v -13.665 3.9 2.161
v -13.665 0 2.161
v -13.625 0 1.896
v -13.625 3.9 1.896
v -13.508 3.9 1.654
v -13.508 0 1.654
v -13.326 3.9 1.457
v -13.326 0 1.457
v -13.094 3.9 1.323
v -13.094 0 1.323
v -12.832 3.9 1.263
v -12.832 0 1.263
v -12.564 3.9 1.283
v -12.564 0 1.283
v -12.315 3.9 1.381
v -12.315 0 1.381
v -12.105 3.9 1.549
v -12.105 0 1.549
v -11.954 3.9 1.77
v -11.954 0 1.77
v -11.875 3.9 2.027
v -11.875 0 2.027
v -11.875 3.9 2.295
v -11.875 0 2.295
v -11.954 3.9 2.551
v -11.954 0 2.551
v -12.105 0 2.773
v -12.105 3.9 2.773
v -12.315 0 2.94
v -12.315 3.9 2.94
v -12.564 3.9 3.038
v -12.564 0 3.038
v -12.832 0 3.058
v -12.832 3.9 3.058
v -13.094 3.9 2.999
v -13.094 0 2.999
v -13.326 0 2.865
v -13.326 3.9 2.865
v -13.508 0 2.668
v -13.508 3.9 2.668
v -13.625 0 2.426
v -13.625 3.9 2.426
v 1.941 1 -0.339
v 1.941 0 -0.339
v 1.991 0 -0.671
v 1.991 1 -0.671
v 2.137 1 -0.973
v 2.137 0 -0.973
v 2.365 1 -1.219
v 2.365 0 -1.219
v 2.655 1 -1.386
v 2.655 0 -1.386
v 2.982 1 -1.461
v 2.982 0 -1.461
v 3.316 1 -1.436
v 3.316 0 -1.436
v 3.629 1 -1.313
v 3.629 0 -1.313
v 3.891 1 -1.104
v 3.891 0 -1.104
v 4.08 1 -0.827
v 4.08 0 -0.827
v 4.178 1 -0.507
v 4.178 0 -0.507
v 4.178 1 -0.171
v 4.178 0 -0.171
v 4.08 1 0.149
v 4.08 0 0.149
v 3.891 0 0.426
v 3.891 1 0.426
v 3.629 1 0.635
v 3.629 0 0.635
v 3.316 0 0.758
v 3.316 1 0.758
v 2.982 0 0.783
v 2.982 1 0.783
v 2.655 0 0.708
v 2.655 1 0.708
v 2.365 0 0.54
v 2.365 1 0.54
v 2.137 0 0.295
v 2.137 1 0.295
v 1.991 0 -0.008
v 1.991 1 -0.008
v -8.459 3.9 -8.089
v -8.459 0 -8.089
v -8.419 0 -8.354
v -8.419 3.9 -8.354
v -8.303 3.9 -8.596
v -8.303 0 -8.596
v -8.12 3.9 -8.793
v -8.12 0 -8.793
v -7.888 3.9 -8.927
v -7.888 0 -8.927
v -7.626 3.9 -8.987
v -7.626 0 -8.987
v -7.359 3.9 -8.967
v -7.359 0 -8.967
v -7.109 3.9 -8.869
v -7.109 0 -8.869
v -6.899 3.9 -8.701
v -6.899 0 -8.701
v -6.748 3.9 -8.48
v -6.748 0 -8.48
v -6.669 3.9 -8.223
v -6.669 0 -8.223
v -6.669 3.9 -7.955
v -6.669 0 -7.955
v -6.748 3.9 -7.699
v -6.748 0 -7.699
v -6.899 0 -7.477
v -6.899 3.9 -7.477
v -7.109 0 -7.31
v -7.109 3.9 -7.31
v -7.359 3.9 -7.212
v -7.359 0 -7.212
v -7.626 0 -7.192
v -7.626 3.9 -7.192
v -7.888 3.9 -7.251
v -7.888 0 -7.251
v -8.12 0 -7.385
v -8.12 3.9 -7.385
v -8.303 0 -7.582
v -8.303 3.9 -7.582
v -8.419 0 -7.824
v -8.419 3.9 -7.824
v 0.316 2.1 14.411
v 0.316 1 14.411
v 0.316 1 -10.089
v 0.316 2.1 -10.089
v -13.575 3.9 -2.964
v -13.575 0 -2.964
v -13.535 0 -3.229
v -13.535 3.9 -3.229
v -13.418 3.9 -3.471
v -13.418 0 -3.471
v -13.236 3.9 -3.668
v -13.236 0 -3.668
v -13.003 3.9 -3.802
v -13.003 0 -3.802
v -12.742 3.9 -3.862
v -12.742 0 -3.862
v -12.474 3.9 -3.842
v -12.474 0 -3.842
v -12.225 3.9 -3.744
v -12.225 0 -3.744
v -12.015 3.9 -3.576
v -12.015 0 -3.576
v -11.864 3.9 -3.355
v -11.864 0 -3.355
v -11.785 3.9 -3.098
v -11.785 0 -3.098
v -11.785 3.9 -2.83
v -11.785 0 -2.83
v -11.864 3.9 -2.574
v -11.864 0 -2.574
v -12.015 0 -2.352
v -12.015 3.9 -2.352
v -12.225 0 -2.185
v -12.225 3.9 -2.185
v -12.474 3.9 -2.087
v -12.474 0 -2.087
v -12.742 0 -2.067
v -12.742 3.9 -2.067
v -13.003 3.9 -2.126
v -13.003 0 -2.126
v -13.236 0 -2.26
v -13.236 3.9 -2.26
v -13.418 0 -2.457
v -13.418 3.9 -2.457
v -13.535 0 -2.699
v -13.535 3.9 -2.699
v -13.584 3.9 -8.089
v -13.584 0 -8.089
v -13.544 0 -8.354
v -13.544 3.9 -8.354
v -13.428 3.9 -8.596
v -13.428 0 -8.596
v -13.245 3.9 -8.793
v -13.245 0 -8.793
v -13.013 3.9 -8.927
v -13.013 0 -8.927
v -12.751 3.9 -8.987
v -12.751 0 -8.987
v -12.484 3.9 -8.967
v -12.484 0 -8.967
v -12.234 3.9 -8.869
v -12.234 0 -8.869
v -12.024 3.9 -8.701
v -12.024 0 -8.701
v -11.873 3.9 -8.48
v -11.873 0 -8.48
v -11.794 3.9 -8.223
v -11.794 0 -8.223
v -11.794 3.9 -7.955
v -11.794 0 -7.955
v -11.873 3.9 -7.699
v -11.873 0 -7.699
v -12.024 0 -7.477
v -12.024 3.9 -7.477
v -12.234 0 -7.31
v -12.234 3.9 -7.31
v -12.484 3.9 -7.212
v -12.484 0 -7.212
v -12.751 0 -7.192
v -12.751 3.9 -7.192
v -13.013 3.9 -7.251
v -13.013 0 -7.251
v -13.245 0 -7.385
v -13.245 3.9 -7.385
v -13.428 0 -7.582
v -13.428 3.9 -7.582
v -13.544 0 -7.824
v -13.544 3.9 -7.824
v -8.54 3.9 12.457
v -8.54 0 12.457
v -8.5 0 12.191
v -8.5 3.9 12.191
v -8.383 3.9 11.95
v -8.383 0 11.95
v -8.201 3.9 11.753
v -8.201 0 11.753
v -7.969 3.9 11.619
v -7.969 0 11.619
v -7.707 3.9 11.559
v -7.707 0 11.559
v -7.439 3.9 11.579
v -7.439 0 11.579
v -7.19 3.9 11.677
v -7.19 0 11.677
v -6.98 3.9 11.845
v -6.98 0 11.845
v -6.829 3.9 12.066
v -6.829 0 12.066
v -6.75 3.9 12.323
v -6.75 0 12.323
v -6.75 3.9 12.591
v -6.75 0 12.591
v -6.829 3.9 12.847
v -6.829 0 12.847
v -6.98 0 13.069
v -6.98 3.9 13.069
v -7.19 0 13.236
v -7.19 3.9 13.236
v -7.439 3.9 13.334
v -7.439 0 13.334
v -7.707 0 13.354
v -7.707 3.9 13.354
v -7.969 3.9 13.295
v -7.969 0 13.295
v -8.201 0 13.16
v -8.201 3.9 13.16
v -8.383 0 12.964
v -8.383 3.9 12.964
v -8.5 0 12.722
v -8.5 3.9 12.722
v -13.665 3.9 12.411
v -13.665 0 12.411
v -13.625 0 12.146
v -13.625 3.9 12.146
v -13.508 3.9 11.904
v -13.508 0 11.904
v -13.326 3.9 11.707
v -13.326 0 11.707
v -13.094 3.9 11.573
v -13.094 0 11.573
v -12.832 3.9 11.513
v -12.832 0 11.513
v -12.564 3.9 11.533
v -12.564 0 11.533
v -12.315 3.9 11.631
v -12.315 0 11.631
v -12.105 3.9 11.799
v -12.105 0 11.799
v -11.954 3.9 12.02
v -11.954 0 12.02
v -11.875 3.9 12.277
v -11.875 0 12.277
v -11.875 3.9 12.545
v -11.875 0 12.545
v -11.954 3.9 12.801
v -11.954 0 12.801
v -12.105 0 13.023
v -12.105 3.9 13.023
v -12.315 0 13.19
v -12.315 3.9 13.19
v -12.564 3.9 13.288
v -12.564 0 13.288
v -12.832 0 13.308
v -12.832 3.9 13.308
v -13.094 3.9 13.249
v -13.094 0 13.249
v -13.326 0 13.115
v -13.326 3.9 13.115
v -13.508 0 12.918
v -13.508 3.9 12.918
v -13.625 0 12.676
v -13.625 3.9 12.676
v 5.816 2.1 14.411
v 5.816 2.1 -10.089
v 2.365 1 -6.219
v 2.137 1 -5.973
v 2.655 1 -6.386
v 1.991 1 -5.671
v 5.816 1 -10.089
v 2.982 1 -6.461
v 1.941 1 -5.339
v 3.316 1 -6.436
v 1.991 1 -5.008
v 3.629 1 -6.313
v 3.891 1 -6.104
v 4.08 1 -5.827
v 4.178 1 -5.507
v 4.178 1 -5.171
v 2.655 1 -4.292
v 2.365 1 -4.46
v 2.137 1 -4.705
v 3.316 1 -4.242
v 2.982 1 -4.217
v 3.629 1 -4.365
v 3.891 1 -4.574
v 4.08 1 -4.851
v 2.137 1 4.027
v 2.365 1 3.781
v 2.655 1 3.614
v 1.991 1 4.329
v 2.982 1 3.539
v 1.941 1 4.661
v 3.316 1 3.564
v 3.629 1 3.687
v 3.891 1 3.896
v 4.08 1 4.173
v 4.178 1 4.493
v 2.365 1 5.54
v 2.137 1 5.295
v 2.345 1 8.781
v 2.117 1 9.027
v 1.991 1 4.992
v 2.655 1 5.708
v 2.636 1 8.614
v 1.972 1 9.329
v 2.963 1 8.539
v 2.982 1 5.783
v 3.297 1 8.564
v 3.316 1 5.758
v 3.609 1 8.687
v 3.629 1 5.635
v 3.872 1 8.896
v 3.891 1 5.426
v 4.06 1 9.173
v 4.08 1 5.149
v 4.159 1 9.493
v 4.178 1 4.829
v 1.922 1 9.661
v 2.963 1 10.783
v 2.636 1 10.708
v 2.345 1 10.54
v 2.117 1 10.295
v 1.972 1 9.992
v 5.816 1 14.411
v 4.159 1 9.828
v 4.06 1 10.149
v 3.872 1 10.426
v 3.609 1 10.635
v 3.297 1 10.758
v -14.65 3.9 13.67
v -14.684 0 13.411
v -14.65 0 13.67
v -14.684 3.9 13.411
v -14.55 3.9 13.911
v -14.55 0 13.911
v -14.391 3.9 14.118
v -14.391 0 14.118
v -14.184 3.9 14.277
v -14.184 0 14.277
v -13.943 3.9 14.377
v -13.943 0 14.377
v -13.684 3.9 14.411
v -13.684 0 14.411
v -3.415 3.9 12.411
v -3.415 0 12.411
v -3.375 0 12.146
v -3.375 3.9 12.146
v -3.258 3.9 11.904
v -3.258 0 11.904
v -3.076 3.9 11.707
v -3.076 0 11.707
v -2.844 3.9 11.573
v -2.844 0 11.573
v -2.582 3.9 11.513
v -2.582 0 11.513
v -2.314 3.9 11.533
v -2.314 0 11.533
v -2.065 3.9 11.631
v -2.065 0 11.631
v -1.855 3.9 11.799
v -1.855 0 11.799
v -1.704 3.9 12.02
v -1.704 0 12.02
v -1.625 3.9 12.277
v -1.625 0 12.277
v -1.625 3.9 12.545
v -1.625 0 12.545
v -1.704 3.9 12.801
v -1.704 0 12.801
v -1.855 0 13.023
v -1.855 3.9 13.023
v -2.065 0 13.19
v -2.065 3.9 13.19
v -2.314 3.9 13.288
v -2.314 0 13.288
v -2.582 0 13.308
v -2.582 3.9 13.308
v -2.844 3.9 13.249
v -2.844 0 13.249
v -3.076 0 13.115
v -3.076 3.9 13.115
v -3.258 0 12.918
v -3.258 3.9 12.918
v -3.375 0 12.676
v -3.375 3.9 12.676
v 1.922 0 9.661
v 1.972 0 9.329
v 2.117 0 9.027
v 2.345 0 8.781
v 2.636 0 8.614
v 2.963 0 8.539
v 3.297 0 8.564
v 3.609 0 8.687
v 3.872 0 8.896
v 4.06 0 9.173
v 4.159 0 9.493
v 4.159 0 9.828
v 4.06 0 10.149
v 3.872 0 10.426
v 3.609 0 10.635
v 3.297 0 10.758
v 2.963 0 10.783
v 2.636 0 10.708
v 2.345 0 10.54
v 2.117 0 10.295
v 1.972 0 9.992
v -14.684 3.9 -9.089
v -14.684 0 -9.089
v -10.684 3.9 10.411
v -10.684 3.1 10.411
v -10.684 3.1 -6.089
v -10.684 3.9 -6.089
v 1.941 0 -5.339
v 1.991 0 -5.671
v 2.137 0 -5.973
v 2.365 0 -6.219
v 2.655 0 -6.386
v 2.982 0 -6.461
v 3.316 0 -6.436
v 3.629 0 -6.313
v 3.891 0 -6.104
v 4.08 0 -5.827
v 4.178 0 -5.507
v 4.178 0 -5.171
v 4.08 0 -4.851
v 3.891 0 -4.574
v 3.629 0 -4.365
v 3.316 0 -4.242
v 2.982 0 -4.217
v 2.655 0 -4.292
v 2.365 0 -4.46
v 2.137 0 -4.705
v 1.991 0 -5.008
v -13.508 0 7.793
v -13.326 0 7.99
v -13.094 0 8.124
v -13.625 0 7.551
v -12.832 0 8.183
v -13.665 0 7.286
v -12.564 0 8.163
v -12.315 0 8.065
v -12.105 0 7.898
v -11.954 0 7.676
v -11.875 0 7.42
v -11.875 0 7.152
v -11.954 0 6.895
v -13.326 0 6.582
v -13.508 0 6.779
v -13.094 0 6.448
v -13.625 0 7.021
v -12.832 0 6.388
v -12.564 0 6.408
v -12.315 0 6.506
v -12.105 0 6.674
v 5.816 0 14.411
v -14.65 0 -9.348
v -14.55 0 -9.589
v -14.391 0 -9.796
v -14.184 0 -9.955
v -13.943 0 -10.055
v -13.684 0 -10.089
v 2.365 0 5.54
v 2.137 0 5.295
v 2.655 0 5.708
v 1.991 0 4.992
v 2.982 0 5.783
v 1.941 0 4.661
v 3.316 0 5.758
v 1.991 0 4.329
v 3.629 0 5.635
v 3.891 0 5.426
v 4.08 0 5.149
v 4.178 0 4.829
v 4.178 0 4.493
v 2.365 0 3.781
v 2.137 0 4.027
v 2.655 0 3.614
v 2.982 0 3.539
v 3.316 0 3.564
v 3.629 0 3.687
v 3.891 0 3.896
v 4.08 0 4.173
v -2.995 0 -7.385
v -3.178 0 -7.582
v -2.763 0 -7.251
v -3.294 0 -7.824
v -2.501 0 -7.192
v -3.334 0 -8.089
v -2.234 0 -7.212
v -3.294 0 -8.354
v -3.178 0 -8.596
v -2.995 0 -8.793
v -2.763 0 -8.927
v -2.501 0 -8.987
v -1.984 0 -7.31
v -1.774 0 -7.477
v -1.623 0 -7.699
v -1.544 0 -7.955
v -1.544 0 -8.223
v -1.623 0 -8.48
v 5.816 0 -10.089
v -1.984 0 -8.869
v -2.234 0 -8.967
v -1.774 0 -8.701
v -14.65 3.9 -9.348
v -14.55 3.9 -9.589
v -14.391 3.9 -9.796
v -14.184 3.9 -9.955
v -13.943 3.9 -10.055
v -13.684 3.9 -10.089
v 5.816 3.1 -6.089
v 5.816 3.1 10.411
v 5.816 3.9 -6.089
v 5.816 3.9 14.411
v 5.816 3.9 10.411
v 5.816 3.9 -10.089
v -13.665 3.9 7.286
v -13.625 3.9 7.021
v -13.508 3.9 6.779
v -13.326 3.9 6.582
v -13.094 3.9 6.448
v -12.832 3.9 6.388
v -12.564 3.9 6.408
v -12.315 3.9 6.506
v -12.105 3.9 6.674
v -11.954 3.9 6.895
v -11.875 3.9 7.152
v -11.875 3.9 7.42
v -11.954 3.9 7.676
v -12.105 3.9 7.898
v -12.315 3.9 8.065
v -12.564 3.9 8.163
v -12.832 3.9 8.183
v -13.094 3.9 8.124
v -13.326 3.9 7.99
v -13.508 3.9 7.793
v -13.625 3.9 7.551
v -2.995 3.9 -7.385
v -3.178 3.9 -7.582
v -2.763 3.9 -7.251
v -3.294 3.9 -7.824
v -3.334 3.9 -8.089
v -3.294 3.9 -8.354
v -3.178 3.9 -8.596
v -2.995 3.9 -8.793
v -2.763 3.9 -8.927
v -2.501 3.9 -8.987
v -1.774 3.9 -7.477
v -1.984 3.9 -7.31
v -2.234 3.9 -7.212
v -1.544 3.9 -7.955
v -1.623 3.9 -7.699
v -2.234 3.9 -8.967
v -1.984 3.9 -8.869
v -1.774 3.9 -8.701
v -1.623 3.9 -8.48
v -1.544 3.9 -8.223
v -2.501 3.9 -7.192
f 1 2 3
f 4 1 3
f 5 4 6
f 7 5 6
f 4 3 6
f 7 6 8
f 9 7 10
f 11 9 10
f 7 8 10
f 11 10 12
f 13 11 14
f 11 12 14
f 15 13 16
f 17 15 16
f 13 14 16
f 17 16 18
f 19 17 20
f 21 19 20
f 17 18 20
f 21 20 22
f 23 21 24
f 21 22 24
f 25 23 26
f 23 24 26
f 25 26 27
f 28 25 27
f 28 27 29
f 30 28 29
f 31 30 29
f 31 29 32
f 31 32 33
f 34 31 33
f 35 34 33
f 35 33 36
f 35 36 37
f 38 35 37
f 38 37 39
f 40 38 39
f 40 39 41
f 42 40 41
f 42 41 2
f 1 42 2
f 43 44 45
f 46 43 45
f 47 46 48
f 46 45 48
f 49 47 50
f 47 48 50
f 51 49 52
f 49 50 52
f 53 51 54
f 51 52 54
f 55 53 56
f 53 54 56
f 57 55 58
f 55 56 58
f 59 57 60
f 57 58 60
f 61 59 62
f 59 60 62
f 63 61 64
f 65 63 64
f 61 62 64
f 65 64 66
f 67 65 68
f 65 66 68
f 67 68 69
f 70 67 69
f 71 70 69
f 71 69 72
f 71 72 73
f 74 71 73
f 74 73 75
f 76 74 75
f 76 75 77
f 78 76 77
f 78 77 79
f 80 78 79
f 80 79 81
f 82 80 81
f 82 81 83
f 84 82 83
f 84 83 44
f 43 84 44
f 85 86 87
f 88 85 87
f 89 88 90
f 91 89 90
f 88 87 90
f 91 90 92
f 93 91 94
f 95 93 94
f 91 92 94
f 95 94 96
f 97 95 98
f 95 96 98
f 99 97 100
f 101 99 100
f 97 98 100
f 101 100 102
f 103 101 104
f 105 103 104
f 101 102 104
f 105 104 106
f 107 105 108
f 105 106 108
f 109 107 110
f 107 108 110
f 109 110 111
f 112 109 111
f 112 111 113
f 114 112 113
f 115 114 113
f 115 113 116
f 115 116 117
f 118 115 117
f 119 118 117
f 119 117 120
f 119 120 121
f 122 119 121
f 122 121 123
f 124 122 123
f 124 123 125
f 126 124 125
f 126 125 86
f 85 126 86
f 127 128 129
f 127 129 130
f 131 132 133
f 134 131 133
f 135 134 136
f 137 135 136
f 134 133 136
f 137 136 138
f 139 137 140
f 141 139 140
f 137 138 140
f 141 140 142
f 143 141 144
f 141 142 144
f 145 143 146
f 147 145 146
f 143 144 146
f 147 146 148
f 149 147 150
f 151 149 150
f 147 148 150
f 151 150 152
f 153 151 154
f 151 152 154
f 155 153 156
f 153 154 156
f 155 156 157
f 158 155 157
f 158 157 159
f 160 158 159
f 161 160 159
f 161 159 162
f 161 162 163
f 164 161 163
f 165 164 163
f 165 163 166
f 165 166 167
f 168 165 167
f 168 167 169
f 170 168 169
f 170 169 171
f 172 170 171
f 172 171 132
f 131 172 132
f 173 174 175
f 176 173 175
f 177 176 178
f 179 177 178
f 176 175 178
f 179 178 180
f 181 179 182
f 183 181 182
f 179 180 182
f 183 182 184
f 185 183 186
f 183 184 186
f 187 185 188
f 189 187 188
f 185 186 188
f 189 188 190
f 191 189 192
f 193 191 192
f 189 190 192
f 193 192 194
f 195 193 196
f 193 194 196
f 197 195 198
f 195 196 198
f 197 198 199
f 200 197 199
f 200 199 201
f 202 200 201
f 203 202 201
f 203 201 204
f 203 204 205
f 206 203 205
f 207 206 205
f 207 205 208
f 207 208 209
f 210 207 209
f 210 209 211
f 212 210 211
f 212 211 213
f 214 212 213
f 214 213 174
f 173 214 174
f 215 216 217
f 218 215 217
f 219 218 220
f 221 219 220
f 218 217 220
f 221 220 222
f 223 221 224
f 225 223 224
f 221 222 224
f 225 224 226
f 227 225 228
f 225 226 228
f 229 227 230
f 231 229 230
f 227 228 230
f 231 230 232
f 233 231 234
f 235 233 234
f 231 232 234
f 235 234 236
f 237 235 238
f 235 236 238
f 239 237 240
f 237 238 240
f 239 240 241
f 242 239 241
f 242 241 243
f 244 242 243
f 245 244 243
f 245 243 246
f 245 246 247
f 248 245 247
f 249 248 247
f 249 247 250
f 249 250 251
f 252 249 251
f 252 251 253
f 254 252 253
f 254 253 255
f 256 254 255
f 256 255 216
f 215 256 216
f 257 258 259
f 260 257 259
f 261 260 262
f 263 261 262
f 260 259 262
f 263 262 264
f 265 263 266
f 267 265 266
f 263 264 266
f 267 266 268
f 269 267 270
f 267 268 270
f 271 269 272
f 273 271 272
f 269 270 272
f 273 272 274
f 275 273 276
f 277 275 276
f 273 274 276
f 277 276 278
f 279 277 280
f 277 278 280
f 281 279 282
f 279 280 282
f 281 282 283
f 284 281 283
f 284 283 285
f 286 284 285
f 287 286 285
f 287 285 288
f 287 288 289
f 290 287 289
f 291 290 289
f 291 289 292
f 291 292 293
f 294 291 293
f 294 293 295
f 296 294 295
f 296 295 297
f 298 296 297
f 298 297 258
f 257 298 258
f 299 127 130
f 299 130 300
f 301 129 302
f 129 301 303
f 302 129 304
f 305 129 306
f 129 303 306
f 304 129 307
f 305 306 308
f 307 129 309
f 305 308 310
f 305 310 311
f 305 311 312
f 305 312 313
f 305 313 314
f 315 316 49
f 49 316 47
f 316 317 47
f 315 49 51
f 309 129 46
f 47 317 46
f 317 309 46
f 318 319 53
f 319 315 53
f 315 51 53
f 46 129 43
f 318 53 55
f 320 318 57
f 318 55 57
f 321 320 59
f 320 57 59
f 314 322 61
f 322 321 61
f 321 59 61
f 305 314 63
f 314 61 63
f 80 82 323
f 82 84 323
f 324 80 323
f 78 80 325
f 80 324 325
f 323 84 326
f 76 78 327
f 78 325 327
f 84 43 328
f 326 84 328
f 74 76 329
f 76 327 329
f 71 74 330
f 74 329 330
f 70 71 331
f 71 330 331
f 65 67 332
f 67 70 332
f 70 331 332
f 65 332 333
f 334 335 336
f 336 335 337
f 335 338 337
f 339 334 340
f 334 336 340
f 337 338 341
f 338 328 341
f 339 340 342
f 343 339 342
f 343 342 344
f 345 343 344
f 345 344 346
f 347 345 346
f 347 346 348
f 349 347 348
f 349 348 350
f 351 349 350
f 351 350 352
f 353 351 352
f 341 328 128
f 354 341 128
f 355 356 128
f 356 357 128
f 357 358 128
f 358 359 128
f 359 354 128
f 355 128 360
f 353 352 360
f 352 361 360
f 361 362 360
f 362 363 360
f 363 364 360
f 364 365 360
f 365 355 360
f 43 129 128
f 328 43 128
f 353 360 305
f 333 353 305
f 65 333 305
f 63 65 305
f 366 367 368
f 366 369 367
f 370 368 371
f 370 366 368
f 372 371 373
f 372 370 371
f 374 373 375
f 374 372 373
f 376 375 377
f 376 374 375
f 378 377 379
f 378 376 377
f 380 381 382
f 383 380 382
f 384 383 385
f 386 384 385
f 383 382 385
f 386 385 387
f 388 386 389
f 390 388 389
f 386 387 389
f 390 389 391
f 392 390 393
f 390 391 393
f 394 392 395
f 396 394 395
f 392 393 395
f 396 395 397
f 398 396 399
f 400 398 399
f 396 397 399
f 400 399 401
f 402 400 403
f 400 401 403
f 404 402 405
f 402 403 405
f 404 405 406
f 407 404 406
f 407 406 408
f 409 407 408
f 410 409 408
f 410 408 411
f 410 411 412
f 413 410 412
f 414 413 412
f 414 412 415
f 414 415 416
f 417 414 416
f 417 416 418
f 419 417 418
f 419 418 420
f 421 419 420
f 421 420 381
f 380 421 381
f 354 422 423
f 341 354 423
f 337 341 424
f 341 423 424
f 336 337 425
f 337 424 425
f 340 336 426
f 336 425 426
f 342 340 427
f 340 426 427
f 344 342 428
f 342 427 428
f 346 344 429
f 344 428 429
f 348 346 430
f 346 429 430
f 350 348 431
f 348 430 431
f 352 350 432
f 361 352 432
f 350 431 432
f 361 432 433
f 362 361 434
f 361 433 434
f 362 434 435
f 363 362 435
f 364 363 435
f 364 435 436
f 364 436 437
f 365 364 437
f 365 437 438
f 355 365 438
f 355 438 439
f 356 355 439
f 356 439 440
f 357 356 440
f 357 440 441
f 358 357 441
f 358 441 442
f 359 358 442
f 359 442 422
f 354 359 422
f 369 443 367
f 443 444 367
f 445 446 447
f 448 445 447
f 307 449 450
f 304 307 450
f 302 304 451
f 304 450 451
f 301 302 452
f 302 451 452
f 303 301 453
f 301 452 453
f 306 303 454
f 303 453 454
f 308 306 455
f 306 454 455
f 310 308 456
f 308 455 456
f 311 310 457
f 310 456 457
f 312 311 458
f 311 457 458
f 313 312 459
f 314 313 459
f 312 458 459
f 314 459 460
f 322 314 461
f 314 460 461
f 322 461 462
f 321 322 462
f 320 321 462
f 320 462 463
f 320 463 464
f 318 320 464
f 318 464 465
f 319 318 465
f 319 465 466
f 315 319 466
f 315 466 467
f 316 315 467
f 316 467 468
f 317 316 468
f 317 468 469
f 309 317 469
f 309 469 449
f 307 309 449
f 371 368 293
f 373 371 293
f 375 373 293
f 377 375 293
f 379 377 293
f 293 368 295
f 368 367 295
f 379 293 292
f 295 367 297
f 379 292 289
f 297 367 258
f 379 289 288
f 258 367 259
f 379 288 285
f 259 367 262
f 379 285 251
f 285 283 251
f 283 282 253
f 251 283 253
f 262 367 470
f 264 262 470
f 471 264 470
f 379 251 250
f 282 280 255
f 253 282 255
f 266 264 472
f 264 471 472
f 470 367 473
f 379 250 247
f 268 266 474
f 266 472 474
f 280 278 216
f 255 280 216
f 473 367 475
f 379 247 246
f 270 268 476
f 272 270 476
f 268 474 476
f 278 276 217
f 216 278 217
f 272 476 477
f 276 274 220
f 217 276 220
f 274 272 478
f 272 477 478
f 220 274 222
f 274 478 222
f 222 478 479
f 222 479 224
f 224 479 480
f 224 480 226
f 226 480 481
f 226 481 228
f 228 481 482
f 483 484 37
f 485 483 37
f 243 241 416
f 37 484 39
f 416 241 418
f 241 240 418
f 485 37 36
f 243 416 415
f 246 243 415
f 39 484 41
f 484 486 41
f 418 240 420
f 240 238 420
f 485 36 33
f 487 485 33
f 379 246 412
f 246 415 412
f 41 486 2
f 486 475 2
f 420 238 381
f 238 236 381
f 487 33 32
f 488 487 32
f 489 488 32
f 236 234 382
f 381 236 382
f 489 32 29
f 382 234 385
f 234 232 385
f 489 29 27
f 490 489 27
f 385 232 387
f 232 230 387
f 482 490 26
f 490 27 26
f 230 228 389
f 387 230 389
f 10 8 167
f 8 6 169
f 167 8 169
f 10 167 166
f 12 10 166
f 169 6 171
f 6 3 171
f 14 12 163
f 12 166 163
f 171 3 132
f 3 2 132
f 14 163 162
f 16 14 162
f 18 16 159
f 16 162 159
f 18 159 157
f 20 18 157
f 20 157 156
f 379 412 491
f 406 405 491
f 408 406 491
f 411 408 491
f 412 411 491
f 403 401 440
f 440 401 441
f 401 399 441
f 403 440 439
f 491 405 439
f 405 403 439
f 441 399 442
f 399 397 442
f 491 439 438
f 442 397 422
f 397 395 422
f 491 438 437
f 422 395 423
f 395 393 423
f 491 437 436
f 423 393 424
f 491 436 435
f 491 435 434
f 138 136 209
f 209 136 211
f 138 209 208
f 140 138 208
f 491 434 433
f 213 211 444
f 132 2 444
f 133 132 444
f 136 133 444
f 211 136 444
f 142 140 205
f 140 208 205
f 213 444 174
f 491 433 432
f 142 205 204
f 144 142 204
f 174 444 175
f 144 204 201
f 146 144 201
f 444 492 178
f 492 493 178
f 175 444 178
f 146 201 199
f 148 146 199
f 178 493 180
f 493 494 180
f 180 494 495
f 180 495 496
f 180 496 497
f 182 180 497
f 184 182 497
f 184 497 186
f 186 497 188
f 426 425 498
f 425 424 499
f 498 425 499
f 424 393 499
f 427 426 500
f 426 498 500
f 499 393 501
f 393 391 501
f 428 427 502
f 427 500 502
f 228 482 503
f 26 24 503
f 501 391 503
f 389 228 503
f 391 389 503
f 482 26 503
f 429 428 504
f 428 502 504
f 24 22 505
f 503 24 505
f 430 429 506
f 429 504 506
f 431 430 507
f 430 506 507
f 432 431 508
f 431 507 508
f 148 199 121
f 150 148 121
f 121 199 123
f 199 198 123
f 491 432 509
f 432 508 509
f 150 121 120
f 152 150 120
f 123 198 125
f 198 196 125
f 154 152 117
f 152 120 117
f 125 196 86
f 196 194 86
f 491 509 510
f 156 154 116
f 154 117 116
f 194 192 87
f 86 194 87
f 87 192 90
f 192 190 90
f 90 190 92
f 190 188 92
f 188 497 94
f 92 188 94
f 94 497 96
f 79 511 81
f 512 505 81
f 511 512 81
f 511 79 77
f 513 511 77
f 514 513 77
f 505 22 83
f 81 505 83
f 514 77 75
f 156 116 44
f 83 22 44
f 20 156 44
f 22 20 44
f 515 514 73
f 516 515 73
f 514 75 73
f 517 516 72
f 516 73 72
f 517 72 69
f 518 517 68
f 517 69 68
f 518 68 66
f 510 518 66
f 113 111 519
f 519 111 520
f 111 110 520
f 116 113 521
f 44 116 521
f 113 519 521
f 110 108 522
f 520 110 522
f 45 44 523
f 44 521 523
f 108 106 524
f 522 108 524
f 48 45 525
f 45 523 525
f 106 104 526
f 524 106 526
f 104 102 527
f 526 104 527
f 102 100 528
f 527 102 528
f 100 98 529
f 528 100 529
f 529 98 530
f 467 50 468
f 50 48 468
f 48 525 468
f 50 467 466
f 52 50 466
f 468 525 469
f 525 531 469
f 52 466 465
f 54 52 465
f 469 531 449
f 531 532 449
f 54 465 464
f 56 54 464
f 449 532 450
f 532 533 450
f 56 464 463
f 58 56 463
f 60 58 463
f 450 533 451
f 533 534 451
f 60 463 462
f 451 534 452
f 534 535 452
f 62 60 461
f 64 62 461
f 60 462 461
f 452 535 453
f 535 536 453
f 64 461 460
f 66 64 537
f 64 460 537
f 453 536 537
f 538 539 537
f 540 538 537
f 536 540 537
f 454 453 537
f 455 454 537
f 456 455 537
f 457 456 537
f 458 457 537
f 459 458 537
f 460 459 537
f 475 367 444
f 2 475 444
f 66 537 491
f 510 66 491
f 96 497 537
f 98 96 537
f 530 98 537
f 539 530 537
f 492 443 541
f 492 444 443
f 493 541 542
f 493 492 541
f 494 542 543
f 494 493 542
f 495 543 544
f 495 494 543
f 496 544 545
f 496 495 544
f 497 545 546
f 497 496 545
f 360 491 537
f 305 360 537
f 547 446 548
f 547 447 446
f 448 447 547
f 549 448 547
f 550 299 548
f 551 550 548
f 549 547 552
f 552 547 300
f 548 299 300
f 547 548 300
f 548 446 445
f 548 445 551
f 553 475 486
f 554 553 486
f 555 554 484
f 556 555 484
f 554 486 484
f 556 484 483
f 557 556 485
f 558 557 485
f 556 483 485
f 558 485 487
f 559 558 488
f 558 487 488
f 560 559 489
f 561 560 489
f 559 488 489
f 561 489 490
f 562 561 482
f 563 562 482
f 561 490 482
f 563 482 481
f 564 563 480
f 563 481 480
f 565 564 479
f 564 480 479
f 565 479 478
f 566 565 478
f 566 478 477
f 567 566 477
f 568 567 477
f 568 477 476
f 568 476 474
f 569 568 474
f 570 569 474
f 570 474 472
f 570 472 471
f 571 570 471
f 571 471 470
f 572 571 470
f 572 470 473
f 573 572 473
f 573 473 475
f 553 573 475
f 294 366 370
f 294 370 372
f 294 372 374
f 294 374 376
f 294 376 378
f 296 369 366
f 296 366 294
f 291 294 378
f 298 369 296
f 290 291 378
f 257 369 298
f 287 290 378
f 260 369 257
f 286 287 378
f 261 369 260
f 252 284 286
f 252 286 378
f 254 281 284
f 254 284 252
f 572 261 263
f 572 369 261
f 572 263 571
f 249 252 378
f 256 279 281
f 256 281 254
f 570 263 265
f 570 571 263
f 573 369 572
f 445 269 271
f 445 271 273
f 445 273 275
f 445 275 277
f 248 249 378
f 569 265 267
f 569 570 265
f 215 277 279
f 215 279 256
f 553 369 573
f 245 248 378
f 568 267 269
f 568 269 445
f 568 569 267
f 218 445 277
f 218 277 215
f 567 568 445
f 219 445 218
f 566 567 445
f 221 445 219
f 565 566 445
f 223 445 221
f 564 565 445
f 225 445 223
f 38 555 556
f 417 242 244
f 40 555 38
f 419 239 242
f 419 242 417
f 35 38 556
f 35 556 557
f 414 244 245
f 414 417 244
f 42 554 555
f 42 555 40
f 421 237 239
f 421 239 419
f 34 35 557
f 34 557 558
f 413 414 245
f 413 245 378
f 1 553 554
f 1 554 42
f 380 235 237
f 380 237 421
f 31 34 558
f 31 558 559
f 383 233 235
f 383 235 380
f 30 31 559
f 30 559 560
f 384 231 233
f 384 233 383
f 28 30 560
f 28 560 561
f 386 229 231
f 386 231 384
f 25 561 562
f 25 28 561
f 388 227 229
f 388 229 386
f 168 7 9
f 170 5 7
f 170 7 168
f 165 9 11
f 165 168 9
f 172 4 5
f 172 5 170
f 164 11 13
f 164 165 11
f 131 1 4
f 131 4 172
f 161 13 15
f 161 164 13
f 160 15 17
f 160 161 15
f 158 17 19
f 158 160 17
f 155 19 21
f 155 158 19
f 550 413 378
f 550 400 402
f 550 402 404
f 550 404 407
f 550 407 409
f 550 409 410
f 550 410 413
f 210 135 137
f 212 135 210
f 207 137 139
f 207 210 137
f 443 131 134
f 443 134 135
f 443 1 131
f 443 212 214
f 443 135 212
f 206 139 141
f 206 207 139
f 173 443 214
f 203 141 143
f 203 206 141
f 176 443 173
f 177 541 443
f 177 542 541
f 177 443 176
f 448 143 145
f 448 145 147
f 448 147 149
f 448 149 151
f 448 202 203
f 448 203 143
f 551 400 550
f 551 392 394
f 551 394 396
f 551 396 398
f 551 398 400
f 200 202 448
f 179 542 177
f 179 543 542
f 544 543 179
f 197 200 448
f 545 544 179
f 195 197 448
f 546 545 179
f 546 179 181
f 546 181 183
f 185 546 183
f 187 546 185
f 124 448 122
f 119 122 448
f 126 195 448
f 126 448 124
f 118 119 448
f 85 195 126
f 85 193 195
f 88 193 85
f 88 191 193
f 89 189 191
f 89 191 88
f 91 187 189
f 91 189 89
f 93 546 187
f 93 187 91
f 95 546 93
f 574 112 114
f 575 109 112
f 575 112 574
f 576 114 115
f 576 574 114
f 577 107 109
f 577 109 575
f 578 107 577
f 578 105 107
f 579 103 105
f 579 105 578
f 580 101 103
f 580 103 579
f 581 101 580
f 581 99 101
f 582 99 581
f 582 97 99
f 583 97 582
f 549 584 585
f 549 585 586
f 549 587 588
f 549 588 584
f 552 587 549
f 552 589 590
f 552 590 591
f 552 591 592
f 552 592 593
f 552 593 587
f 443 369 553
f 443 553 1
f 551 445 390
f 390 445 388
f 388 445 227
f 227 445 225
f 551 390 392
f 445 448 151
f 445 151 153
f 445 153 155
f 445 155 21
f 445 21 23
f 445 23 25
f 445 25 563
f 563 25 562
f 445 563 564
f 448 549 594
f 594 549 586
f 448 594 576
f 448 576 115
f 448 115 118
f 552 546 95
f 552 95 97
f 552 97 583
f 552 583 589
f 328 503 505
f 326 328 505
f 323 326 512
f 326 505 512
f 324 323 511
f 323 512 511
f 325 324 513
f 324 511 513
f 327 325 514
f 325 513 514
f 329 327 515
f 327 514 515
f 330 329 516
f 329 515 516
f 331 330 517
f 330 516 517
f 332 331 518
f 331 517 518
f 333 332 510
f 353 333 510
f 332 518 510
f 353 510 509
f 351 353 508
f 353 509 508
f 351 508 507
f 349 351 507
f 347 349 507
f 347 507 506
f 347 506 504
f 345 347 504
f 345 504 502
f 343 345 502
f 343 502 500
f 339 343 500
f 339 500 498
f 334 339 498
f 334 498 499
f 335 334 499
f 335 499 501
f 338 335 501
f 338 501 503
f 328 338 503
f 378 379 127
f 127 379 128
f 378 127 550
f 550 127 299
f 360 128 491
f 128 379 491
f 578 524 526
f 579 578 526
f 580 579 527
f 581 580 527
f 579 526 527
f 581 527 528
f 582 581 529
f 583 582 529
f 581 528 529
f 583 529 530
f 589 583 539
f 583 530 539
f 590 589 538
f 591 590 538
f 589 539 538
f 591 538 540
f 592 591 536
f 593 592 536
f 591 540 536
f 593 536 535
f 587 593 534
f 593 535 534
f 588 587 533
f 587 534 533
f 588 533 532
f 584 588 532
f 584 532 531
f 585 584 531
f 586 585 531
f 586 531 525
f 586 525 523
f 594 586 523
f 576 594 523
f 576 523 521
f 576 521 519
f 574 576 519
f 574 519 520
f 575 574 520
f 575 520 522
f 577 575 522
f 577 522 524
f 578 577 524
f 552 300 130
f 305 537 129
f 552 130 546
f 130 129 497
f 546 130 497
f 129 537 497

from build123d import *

# Parameters (mm, degrees)
SKETCH1_W                           = 20.5
SKETCH1_H                           = 24.5
BOSS_EXTRUDE1_DEPTH                 = 3.1
SKETCH2_W                           = 5.5
SKETCH2_H                           = 1.1
CUT_EXTRUDE1_DEPTH                  = 29.731142046
SKETCH3_W                           = 16.5
SKETCH3_H                           = 4
BOSS_EXTRUDE2_DEPTH                 = 0.8
TAP_DRILL_FOR_M2_5X0_45_TAP1_REACH  = 22.94
TAP_DRILL_FOR_M2_5X0_45_TAP1_BORE_R = 1.125
TAP_DRILL_FOR_M2X0_4_TAP2_D         = 1.8
FILLET2_R                           = 1


with BuildPart() as part:
    # Sketch1 → Boss-Extrude1 (new body)
    with BuildSketch(Plane(origin=(0, 0, 0), x_dir=(1, 0, 0), z_dir=(0, 1, 0))):
        with Locations((-4.433954619, -2.160858995)):
            Rectangle(SKETCH1_W, SKETCH1_H)
    extrude(amount=BOSS_EXTRUDE1_DEPTH)

    # Sketch2 → Cut-Extrude1 (cut, through all)
    with BuildSketch(Plane.XY.offset(14.410858995)):
        with Locations((3.066045381, 1.55)):
            Rectangle(SKETCH2_W, SKETCH2_H)
    extrude(amount=-CUT_EXTRUDE1_DEPTH, mode=Mode.SUBTRACT)

    # Sketch3 → Boss-Extrude2 (add)
    with BuildSketch(Plane(origin=(0, 3.1, 0), x_dir=(1, 0, 0), z_dir=(0, 1, 0))):
        Polygon((-10.683954619, 10.089141005), (-14.683954619, 10.089141005), (-14.683954619, -14.410858995), (-10.683954619, -14.410858995), (-10.683954619, -10.410858995), (-10.683954619, 6.089141005), align=None)
        with Locations((-2.433954619, 8.089141005)):
            Rectangle(SKETCH3_W, SKETCH3_H)
        with Locations((-2.433954619, -12.410858995)):
            Rectangle(SKETCH3_W, SKETCH3_H)
    extrude(amount=BOSS_EXTRUDE2_DEPTH)

    # Tap Drill for M2.5x0.45 Tap1 bore → Tap Drill for M2.5x0.45 Tap1 (cut, up to next)
    with BuildSketch(Plane(origin=(0, 0, 0), x_dir=(-1, 0, 0), z_dir=(0, -1, 0)), mode=Mode.PRIVATE) as tap_drill_for_m2_5x0_45_tap1_sk1:
        with Locations((-3.066045381, 5.339141005)):
            Circle(TAP_DRILL_FOR_M2_5X0_45_TAP1_BORE_R)
    tap_drill_for_m2_5x0_45_tap1_tool1 = extrude(tap_drill_for_m2_5x0_45_tap1_sk1.sketch, amount=-TAP_DRILL_FOR_M2_5X0_45_TAP1_REACH, mode=Mode.PRIVATE) & part.part
    # Tap Drill for M2.5x0.45 Tap1 bore → Tap Drill for M2.5x0.45 Tap1 (cut, up to next)
    with BuildSketch(Plane(origin=(0, 0, 0), x_dir=(-1, 0, 0), z_dir=(0, -1, 0)), mode=Mode.PRIVATE) as tap_drill_for_m2_5x0_45_tap1_sk2:
        with Locations((-3.066045381, 0.339141005)):
            Circle(TAP_DRILL_FOR_M2_5X0_45_TAP1_BORE_R)
    tap_drill_for_m2_5x0_45_tap1_tool2 = extrude(tap_drill_for_m2_5x0_45_tap1_sk2.sketch, amount=-TAP_DRILL_FOR_M2_5X0_45_TAP1_REACH, mode=Mode.PRIVATE) & part.part
    # Tap Drill for M2.5x0.45 Tap1 bore → Tap Drill for M2.5x0.45 Tap1 (cut, up to next)
    with BuildSketch(Plane(origin=(0, 0, 0), x_dir=(-1, 0, 0), z_dir=(0, -1, 0)), mode=Mode.PRIVATE) as tap_drill_for_m2_5x0_45_tap1_sk3:
        with Locations((-3.066045381, -4.660858995)):
            Circle(TAP_DRILL_FOR_M2_5X0_45_TAP1_BORE_R)
    tap_drill_for_m2_5x0_45_tap1_tool3 = extrude(tap_drill_for_m2_5x0_45_tap1_sk3.sketch, amount=-TAP_DRILL_FOR_M2_5X0_45_TAP1_REACH, mode=Mode.PRIVATE) & part.part
    # Tap Drill for M2.5x0.45 Tap1 bore → Tap Drill for M2.5x0.45 Tap1 (cut, up to next)
    with BuildSketch(Plane(origin=(0, 0, 0), x_dir=(-1, 0, 0), z_dir=(0, -1, 0)), mode=Mode.PRIVATE) as tap_drill_for_m2_5x0_45_tap1_sk4:
        with Locations((-3.046847319, -9.660822138)):
            Circle(TAP_DRILL_FOR_M2_5X0_45_TAP1_BORE_R)
    tap_drill_for_m2_5x0_45_tap1_tool4 = extrude(tap_drill_for_m2_5x0_45_tap1_sk4.sketch, amount=-TAP_DRILL_FOR_M2_5X0_45_TAP1_REACH, mode=Mode.PRIVATE) & part.part
    add(tap_drill_for_m2_5x0_45_tap1_tool1.solids().sort_by_distance((3.066045, 0, -5.339141))[0], mode=Mode.SUBTRACT)
    add(tap_drill_for_m2_5x0_45_tap1_tool2.solids().sort_by_distance((3.066045, 0, -0.339141))[0], mode=Mode.SUBTRACT)
    add(tap_drill_for_m2_5x0_45_tap1_tool3.solids().sort_by_distance((3.066045, 0, 4.660859))[0], mode=Mode.SUBTRACT)
    add(tap_drill_for_m2_5x0_45_tap1_tool4.solids().sort_by_distance((3.046847, 0, 9.660822))[0], mode=Mode.SUBTRACT)

    # Tap Drill for M2x0.4 Tap2 (through all)
    with Locations(Plane(origin=(0, 3.9, 0), x_dir=(1, 0, 0), z_dir=(0, 1, 0))):
        with Locations((-12.683954619, 8.089141005), (-12.674525688, 2.964141005), (-12.764705981, -2.160858995), (-12.764705981, -7.285858995), (-12.764705981, -12.410858995), (-7.558954619, 8.089141005), (-2.433954619, 8.089141005), (-2.514705981, -12.410858995), (-7.639705981, -12.456722912)):
            Hole(TAP_DRILL_FOR_M2X0_4_TAP2_D / 2)

    # Fillet2
    fillet2_edges = [part.edges().sort_by_distance(p)[0] for p in [
        (-14.683954619, 1.95, -10.089141005),
        (-14.683954619, 1.95, 14.410858995),
    ]]
    fillet(fillet2_edges, radius=FILLET2_R)


solid = part.part
